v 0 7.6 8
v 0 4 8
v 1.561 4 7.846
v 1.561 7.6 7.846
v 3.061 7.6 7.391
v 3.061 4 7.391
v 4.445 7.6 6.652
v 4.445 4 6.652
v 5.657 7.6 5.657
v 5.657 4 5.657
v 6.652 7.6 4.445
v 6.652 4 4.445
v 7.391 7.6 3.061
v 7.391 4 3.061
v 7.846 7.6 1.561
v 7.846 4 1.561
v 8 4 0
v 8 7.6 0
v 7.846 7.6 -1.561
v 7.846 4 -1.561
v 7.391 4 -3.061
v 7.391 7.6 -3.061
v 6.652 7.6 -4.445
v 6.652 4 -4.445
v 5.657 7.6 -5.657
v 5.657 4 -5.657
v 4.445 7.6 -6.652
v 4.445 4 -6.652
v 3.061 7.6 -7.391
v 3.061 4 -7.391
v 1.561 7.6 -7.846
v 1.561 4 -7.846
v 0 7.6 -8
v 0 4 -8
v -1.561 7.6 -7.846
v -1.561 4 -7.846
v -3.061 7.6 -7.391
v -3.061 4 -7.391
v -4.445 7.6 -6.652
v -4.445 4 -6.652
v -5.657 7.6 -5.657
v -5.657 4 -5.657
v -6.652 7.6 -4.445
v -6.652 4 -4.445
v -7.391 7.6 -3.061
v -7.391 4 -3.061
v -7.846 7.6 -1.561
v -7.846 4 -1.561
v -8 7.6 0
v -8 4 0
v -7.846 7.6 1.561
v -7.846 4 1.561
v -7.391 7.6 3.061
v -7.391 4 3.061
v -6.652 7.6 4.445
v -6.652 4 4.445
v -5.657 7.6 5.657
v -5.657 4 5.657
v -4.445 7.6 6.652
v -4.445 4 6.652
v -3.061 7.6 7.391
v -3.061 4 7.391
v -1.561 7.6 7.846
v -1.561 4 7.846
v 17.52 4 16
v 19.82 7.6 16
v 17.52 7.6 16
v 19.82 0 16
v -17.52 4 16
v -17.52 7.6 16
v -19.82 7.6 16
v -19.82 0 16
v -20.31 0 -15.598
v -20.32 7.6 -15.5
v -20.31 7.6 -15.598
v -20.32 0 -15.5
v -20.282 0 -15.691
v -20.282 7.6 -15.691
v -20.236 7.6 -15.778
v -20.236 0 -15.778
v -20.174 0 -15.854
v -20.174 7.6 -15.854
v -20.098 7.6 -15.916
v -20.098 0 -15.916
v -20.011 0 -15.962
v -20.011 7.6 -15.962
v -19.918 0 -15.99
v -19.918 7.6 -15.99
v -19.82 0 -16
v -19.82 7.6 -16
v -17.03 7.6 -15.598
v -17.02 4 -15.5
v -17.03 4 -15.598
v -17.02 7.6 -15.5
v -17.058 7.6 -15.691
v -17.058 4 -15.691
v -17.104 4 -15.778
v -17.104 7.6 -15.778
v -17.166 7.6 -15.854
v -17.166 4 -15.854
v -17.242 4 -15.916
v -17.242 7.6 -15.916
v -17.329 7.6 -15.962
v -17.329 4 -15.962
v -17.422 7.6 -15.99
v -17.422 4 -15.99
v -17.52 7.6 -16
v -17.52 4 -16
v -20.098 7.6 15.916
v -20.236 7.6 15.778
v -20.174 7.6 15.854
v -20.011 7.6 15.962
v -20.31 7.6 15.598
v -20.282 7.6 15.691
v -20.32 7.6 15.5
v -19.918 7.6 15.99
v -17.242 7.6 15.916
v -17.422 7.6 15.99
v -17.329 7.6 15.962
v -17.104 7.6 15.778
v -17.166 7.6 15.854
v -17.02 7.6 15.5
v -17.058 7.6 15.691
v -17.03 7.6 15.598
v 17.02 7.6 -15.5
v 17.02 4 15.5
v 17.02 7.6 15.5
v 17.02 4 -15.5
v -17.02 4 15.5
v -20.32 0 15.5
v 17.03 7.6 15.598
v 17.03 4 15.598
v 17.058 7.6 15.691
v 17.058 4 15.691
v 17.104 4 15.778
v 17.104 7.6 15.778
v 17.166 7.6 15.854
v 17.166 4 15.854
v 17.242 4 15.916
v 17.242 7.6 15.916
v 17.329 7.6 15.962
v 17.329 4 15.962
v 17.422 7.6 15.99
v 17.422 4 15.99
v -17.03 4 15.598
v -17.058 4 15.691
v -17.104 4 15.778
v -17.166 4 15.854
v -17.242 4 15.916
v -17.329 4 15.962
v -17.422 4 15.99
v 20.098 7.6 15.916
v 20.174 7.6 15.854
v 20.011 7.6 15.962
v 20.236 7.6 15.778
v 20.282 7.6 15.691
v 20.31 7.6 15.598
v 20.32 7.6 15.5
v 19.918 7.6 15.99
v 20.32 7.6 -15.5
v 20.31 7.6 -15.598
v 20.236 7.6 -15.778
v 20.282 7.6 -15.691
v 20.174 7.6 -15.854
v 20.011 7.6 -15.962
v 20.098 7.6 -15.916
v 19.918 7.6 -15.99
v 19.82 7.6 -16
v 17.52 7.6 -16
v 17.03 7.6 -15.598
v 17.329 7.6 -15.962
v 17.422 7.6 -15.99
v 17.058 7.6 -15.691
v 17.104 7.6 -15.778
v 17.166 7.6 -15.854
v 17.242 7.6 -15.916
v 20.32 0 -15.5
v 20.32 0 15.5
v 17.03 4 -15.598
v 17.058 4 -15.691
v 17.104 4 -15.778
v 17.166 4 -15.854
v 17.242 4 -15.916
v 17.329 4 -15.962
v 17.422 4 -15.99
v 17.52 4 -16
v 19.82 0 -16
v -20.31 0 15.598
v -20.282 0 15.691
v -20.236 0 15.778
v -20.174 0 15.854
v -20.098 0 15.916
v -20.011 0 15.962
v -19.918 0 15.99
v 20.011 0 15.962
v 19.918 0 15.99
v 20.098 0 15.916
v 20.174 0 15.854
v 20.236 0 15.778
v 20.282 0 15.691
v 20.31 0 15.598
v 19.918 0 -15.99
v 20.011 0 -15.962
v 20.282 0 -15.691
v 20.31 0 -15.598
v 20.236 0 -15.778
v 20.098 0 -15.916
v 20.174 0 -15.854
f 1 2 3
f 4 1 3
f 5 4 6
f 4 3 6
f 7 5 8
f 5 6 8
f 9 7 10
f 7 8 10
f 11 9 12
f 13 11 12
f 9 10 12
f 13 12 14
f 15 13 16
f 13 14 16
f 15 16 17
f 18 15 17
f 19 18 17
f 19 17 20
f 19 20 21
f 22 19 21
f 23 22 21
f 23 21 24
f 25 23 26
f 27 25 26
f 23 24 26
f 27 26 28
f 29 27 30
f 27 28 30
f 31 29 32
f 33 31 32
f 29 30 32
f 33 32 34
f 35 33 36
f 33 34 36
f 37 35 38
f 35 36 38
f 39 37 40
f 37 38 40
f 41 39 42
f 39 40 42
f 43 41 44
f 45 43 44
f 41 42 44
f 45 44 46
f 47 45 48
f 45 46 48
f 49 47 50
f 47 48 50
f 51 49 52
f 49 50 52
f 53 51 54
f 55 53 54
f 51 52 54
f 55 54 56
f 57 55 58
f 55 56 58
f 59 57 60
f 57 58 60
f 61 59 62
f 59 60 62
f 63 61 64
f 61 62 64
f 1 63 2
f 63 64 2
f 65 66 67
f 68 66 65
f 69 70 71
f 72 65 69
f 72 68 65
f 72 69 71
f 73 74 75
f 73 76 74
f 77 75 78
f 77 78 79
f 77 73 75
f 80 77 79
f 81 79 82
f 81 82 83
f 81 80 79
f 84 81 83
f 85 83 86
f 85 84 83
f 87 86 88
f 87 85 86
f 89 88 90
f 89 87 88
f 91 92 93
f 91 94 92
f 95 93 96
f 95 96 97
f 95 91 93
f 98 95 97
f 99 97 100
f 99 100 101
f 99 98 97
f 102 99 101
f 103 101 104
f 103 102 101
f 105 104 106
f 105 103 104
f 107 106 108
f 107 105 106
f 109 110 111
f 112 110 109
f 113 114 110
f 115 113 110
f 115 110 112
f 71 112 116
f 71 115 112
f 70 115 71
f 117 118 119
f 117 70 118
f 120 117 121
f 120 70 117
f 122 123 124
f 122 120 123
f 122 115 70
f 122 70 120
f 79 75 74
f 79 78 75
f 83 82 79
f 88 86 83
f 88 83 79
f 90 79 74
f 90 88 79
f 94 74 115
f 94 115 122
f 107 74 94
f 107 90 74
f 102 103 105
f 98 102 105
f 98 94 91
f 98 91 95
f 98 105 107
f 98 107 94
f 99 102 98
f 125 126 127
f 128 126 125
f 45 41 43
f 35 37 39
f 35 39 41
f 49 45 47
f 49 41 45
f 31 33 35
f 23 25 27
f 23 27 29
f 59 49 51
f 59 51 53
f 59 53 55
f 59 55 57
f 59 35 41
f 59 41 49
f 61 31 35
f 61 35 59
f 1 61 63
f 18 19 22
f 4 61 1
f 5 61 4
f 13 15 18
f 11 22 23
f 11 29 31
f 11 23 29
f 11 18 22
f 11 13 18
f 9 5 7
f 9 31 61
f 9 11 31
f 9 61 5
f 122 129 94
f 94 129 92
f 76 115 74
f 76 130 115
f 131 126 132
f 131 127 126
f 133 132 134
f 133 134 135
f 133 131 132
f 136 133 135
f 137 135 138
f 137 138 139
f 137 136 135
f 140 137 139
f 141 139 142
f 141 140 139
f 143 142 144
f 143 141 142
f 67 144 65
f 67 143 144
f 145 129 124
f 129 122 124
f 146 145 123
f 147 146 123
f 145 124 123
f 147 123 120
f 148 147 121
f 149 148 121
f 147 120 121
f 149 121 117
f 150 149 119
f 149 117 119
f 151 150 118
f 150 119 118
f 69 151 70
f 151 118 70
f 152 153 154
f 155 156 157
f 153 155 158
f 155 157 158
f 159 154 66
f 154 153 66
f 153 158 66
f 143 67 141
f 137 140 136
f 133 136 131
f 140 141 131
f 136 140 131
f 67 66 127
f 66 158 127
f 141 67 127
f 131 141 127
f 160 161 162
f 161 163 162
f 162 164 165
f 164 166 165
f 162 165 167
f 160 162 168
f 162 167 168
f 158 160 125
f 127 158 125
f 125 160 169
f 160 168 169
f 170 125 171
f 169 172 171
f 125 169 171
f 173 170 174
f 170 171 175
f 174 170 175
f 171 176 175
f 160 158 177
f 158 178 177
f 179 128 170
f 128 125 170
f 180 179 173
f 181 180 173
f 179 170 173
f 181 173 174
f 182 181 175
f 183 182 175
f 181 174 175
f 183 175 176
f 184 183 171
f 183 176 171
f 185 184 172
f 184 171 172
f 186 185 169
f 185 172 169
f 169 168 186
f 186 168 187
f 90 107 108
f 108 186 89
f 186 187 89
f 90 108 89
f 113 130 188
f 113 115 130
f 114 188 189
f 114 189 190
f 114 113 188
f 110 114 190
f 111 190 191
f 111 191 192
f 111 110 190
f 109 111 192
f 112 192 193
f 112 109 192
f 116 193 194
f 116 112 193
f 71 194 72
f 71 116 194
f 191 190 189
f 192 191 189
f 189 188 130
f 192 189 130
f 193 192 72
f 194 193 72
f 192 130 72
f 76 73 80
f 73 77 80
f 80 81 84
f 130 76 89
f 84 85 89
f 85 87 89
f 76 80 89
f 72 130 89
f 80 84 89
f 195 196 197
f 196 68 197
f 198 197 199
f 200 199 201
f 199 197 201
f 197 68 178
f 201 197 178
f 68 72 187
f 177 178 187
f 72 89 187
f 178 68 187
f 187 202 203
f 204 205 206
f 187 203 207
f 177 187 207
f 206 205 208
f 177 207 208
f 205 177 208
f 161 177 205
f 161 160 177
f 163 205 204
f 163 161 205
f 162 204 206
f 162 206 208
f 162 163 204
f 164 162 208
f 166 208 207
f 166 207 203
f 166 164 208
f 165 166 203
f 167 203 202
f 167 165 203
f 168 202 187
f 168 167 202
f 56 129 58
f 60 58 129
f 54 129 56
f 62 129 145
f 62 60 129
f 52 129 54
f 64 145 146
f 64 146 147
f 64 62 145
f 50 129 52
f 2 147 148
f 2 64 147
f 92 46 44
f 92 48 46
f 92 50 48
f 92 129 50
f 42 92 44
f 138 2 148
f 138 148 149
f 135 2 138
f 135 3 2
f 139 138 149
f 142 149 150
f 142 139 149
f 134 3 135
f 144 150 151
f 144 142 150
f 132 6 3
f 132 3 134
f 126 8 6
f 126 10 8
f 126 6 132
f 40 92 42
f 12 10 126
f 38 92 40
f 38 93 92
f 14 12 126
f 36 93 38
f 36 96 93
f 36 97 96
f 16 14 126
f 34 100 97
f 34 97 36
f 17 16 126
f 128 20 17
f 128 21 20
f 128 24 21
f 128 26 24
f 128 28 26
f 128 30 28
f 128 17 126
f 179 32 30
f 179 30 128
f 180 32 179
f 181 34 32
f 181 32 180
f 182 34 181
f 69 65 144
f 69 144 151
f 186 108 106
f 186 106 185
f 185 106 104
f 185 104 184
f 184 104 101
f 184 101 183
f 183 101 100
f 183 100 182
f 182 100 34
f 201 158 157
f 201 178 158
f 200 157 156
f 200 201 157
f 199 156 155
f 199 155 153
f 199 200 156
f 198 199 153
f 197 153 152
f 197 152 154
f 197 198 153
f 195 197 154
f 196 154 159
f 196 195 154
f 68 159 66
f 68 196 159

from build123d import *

# Parameters (mm, degrees)
SKETCH1_W           = 40.64
SKETCH1_H           = 32
BOSS_EXTRUDE1_DEPTH = 4
SKETCH2_R           = 8
BOSS_EXTRUDE2_DEPTH = 3.6
SKETCH3_W           = 3.3
SKETCH3_H           = 32
BOSS_EXTRUDE3_DEPTH = 3.6
FILLET1_R           = 0.5


with BuildPart() as part:
    # Sketch1 → Boss-Extrude1 (new body)
    with BuildSketch(Plane(origin=(0, 0, 0), x_dir=(1, 0, 0), z_dir=(0, 1, 0))):
        Rectangle(SKETCH1_W, SKETCH1_H)
    extrude(amount=BOSS_EXTRUDE1_DEPTH)

    # Sketch2 → Boss-Extrude2 (add)
    with BuildSketch(Plane(origin=(0, 4, 0), x_dir=(1, 0, 0), z_dir=(0, 1, 0))):
        with Locations(Location((0, 0, 0), (0, 0, 270))):
            Circle(SKETCH2_R)
    extrude(amount=BOSS_EXTRUDE2_DEPTH)

    # Sketch3 → Boss-Extrude3 (add)
    with BuildSketch(Plane(origin=(0, 4, 0), x_dir=(1, 0, 0), z_dir=(0, 1, 0))):
        with Locations((-18.67, 0)):
            Rectangle(SKETCH3_W, SKETCH3_H)
    boss_extrude3 = extrude(amount=BOSS_EXTRUDE3_DEPTH)

    # Mirror1: Boss-Extrude3 across plane
    add(boss_extrude3.mirror(Plane(origin=(0, 0, 0), x_dir=(0, 0, 1), z_dir=(1, 0, 0))))

    # Fillet1
    fillet1_edges = [part.edges().sort_by_distance(p)[0] for p in [
        (-17.02, 5.8, 16),
        (-17.02, 5.8, -16),
        (17.02, 5.8, 16),
        (17.02, 5.8, -16),
        (20.32, 3.8, 16),
        (-20.32, 3.8, 16),
        (-20.32, 3.8, -16),
        (20.32, 3.8, -16),
    ]]
    fillet(fillet1_edges, radius=FILLET1_R)


solid = part.part
